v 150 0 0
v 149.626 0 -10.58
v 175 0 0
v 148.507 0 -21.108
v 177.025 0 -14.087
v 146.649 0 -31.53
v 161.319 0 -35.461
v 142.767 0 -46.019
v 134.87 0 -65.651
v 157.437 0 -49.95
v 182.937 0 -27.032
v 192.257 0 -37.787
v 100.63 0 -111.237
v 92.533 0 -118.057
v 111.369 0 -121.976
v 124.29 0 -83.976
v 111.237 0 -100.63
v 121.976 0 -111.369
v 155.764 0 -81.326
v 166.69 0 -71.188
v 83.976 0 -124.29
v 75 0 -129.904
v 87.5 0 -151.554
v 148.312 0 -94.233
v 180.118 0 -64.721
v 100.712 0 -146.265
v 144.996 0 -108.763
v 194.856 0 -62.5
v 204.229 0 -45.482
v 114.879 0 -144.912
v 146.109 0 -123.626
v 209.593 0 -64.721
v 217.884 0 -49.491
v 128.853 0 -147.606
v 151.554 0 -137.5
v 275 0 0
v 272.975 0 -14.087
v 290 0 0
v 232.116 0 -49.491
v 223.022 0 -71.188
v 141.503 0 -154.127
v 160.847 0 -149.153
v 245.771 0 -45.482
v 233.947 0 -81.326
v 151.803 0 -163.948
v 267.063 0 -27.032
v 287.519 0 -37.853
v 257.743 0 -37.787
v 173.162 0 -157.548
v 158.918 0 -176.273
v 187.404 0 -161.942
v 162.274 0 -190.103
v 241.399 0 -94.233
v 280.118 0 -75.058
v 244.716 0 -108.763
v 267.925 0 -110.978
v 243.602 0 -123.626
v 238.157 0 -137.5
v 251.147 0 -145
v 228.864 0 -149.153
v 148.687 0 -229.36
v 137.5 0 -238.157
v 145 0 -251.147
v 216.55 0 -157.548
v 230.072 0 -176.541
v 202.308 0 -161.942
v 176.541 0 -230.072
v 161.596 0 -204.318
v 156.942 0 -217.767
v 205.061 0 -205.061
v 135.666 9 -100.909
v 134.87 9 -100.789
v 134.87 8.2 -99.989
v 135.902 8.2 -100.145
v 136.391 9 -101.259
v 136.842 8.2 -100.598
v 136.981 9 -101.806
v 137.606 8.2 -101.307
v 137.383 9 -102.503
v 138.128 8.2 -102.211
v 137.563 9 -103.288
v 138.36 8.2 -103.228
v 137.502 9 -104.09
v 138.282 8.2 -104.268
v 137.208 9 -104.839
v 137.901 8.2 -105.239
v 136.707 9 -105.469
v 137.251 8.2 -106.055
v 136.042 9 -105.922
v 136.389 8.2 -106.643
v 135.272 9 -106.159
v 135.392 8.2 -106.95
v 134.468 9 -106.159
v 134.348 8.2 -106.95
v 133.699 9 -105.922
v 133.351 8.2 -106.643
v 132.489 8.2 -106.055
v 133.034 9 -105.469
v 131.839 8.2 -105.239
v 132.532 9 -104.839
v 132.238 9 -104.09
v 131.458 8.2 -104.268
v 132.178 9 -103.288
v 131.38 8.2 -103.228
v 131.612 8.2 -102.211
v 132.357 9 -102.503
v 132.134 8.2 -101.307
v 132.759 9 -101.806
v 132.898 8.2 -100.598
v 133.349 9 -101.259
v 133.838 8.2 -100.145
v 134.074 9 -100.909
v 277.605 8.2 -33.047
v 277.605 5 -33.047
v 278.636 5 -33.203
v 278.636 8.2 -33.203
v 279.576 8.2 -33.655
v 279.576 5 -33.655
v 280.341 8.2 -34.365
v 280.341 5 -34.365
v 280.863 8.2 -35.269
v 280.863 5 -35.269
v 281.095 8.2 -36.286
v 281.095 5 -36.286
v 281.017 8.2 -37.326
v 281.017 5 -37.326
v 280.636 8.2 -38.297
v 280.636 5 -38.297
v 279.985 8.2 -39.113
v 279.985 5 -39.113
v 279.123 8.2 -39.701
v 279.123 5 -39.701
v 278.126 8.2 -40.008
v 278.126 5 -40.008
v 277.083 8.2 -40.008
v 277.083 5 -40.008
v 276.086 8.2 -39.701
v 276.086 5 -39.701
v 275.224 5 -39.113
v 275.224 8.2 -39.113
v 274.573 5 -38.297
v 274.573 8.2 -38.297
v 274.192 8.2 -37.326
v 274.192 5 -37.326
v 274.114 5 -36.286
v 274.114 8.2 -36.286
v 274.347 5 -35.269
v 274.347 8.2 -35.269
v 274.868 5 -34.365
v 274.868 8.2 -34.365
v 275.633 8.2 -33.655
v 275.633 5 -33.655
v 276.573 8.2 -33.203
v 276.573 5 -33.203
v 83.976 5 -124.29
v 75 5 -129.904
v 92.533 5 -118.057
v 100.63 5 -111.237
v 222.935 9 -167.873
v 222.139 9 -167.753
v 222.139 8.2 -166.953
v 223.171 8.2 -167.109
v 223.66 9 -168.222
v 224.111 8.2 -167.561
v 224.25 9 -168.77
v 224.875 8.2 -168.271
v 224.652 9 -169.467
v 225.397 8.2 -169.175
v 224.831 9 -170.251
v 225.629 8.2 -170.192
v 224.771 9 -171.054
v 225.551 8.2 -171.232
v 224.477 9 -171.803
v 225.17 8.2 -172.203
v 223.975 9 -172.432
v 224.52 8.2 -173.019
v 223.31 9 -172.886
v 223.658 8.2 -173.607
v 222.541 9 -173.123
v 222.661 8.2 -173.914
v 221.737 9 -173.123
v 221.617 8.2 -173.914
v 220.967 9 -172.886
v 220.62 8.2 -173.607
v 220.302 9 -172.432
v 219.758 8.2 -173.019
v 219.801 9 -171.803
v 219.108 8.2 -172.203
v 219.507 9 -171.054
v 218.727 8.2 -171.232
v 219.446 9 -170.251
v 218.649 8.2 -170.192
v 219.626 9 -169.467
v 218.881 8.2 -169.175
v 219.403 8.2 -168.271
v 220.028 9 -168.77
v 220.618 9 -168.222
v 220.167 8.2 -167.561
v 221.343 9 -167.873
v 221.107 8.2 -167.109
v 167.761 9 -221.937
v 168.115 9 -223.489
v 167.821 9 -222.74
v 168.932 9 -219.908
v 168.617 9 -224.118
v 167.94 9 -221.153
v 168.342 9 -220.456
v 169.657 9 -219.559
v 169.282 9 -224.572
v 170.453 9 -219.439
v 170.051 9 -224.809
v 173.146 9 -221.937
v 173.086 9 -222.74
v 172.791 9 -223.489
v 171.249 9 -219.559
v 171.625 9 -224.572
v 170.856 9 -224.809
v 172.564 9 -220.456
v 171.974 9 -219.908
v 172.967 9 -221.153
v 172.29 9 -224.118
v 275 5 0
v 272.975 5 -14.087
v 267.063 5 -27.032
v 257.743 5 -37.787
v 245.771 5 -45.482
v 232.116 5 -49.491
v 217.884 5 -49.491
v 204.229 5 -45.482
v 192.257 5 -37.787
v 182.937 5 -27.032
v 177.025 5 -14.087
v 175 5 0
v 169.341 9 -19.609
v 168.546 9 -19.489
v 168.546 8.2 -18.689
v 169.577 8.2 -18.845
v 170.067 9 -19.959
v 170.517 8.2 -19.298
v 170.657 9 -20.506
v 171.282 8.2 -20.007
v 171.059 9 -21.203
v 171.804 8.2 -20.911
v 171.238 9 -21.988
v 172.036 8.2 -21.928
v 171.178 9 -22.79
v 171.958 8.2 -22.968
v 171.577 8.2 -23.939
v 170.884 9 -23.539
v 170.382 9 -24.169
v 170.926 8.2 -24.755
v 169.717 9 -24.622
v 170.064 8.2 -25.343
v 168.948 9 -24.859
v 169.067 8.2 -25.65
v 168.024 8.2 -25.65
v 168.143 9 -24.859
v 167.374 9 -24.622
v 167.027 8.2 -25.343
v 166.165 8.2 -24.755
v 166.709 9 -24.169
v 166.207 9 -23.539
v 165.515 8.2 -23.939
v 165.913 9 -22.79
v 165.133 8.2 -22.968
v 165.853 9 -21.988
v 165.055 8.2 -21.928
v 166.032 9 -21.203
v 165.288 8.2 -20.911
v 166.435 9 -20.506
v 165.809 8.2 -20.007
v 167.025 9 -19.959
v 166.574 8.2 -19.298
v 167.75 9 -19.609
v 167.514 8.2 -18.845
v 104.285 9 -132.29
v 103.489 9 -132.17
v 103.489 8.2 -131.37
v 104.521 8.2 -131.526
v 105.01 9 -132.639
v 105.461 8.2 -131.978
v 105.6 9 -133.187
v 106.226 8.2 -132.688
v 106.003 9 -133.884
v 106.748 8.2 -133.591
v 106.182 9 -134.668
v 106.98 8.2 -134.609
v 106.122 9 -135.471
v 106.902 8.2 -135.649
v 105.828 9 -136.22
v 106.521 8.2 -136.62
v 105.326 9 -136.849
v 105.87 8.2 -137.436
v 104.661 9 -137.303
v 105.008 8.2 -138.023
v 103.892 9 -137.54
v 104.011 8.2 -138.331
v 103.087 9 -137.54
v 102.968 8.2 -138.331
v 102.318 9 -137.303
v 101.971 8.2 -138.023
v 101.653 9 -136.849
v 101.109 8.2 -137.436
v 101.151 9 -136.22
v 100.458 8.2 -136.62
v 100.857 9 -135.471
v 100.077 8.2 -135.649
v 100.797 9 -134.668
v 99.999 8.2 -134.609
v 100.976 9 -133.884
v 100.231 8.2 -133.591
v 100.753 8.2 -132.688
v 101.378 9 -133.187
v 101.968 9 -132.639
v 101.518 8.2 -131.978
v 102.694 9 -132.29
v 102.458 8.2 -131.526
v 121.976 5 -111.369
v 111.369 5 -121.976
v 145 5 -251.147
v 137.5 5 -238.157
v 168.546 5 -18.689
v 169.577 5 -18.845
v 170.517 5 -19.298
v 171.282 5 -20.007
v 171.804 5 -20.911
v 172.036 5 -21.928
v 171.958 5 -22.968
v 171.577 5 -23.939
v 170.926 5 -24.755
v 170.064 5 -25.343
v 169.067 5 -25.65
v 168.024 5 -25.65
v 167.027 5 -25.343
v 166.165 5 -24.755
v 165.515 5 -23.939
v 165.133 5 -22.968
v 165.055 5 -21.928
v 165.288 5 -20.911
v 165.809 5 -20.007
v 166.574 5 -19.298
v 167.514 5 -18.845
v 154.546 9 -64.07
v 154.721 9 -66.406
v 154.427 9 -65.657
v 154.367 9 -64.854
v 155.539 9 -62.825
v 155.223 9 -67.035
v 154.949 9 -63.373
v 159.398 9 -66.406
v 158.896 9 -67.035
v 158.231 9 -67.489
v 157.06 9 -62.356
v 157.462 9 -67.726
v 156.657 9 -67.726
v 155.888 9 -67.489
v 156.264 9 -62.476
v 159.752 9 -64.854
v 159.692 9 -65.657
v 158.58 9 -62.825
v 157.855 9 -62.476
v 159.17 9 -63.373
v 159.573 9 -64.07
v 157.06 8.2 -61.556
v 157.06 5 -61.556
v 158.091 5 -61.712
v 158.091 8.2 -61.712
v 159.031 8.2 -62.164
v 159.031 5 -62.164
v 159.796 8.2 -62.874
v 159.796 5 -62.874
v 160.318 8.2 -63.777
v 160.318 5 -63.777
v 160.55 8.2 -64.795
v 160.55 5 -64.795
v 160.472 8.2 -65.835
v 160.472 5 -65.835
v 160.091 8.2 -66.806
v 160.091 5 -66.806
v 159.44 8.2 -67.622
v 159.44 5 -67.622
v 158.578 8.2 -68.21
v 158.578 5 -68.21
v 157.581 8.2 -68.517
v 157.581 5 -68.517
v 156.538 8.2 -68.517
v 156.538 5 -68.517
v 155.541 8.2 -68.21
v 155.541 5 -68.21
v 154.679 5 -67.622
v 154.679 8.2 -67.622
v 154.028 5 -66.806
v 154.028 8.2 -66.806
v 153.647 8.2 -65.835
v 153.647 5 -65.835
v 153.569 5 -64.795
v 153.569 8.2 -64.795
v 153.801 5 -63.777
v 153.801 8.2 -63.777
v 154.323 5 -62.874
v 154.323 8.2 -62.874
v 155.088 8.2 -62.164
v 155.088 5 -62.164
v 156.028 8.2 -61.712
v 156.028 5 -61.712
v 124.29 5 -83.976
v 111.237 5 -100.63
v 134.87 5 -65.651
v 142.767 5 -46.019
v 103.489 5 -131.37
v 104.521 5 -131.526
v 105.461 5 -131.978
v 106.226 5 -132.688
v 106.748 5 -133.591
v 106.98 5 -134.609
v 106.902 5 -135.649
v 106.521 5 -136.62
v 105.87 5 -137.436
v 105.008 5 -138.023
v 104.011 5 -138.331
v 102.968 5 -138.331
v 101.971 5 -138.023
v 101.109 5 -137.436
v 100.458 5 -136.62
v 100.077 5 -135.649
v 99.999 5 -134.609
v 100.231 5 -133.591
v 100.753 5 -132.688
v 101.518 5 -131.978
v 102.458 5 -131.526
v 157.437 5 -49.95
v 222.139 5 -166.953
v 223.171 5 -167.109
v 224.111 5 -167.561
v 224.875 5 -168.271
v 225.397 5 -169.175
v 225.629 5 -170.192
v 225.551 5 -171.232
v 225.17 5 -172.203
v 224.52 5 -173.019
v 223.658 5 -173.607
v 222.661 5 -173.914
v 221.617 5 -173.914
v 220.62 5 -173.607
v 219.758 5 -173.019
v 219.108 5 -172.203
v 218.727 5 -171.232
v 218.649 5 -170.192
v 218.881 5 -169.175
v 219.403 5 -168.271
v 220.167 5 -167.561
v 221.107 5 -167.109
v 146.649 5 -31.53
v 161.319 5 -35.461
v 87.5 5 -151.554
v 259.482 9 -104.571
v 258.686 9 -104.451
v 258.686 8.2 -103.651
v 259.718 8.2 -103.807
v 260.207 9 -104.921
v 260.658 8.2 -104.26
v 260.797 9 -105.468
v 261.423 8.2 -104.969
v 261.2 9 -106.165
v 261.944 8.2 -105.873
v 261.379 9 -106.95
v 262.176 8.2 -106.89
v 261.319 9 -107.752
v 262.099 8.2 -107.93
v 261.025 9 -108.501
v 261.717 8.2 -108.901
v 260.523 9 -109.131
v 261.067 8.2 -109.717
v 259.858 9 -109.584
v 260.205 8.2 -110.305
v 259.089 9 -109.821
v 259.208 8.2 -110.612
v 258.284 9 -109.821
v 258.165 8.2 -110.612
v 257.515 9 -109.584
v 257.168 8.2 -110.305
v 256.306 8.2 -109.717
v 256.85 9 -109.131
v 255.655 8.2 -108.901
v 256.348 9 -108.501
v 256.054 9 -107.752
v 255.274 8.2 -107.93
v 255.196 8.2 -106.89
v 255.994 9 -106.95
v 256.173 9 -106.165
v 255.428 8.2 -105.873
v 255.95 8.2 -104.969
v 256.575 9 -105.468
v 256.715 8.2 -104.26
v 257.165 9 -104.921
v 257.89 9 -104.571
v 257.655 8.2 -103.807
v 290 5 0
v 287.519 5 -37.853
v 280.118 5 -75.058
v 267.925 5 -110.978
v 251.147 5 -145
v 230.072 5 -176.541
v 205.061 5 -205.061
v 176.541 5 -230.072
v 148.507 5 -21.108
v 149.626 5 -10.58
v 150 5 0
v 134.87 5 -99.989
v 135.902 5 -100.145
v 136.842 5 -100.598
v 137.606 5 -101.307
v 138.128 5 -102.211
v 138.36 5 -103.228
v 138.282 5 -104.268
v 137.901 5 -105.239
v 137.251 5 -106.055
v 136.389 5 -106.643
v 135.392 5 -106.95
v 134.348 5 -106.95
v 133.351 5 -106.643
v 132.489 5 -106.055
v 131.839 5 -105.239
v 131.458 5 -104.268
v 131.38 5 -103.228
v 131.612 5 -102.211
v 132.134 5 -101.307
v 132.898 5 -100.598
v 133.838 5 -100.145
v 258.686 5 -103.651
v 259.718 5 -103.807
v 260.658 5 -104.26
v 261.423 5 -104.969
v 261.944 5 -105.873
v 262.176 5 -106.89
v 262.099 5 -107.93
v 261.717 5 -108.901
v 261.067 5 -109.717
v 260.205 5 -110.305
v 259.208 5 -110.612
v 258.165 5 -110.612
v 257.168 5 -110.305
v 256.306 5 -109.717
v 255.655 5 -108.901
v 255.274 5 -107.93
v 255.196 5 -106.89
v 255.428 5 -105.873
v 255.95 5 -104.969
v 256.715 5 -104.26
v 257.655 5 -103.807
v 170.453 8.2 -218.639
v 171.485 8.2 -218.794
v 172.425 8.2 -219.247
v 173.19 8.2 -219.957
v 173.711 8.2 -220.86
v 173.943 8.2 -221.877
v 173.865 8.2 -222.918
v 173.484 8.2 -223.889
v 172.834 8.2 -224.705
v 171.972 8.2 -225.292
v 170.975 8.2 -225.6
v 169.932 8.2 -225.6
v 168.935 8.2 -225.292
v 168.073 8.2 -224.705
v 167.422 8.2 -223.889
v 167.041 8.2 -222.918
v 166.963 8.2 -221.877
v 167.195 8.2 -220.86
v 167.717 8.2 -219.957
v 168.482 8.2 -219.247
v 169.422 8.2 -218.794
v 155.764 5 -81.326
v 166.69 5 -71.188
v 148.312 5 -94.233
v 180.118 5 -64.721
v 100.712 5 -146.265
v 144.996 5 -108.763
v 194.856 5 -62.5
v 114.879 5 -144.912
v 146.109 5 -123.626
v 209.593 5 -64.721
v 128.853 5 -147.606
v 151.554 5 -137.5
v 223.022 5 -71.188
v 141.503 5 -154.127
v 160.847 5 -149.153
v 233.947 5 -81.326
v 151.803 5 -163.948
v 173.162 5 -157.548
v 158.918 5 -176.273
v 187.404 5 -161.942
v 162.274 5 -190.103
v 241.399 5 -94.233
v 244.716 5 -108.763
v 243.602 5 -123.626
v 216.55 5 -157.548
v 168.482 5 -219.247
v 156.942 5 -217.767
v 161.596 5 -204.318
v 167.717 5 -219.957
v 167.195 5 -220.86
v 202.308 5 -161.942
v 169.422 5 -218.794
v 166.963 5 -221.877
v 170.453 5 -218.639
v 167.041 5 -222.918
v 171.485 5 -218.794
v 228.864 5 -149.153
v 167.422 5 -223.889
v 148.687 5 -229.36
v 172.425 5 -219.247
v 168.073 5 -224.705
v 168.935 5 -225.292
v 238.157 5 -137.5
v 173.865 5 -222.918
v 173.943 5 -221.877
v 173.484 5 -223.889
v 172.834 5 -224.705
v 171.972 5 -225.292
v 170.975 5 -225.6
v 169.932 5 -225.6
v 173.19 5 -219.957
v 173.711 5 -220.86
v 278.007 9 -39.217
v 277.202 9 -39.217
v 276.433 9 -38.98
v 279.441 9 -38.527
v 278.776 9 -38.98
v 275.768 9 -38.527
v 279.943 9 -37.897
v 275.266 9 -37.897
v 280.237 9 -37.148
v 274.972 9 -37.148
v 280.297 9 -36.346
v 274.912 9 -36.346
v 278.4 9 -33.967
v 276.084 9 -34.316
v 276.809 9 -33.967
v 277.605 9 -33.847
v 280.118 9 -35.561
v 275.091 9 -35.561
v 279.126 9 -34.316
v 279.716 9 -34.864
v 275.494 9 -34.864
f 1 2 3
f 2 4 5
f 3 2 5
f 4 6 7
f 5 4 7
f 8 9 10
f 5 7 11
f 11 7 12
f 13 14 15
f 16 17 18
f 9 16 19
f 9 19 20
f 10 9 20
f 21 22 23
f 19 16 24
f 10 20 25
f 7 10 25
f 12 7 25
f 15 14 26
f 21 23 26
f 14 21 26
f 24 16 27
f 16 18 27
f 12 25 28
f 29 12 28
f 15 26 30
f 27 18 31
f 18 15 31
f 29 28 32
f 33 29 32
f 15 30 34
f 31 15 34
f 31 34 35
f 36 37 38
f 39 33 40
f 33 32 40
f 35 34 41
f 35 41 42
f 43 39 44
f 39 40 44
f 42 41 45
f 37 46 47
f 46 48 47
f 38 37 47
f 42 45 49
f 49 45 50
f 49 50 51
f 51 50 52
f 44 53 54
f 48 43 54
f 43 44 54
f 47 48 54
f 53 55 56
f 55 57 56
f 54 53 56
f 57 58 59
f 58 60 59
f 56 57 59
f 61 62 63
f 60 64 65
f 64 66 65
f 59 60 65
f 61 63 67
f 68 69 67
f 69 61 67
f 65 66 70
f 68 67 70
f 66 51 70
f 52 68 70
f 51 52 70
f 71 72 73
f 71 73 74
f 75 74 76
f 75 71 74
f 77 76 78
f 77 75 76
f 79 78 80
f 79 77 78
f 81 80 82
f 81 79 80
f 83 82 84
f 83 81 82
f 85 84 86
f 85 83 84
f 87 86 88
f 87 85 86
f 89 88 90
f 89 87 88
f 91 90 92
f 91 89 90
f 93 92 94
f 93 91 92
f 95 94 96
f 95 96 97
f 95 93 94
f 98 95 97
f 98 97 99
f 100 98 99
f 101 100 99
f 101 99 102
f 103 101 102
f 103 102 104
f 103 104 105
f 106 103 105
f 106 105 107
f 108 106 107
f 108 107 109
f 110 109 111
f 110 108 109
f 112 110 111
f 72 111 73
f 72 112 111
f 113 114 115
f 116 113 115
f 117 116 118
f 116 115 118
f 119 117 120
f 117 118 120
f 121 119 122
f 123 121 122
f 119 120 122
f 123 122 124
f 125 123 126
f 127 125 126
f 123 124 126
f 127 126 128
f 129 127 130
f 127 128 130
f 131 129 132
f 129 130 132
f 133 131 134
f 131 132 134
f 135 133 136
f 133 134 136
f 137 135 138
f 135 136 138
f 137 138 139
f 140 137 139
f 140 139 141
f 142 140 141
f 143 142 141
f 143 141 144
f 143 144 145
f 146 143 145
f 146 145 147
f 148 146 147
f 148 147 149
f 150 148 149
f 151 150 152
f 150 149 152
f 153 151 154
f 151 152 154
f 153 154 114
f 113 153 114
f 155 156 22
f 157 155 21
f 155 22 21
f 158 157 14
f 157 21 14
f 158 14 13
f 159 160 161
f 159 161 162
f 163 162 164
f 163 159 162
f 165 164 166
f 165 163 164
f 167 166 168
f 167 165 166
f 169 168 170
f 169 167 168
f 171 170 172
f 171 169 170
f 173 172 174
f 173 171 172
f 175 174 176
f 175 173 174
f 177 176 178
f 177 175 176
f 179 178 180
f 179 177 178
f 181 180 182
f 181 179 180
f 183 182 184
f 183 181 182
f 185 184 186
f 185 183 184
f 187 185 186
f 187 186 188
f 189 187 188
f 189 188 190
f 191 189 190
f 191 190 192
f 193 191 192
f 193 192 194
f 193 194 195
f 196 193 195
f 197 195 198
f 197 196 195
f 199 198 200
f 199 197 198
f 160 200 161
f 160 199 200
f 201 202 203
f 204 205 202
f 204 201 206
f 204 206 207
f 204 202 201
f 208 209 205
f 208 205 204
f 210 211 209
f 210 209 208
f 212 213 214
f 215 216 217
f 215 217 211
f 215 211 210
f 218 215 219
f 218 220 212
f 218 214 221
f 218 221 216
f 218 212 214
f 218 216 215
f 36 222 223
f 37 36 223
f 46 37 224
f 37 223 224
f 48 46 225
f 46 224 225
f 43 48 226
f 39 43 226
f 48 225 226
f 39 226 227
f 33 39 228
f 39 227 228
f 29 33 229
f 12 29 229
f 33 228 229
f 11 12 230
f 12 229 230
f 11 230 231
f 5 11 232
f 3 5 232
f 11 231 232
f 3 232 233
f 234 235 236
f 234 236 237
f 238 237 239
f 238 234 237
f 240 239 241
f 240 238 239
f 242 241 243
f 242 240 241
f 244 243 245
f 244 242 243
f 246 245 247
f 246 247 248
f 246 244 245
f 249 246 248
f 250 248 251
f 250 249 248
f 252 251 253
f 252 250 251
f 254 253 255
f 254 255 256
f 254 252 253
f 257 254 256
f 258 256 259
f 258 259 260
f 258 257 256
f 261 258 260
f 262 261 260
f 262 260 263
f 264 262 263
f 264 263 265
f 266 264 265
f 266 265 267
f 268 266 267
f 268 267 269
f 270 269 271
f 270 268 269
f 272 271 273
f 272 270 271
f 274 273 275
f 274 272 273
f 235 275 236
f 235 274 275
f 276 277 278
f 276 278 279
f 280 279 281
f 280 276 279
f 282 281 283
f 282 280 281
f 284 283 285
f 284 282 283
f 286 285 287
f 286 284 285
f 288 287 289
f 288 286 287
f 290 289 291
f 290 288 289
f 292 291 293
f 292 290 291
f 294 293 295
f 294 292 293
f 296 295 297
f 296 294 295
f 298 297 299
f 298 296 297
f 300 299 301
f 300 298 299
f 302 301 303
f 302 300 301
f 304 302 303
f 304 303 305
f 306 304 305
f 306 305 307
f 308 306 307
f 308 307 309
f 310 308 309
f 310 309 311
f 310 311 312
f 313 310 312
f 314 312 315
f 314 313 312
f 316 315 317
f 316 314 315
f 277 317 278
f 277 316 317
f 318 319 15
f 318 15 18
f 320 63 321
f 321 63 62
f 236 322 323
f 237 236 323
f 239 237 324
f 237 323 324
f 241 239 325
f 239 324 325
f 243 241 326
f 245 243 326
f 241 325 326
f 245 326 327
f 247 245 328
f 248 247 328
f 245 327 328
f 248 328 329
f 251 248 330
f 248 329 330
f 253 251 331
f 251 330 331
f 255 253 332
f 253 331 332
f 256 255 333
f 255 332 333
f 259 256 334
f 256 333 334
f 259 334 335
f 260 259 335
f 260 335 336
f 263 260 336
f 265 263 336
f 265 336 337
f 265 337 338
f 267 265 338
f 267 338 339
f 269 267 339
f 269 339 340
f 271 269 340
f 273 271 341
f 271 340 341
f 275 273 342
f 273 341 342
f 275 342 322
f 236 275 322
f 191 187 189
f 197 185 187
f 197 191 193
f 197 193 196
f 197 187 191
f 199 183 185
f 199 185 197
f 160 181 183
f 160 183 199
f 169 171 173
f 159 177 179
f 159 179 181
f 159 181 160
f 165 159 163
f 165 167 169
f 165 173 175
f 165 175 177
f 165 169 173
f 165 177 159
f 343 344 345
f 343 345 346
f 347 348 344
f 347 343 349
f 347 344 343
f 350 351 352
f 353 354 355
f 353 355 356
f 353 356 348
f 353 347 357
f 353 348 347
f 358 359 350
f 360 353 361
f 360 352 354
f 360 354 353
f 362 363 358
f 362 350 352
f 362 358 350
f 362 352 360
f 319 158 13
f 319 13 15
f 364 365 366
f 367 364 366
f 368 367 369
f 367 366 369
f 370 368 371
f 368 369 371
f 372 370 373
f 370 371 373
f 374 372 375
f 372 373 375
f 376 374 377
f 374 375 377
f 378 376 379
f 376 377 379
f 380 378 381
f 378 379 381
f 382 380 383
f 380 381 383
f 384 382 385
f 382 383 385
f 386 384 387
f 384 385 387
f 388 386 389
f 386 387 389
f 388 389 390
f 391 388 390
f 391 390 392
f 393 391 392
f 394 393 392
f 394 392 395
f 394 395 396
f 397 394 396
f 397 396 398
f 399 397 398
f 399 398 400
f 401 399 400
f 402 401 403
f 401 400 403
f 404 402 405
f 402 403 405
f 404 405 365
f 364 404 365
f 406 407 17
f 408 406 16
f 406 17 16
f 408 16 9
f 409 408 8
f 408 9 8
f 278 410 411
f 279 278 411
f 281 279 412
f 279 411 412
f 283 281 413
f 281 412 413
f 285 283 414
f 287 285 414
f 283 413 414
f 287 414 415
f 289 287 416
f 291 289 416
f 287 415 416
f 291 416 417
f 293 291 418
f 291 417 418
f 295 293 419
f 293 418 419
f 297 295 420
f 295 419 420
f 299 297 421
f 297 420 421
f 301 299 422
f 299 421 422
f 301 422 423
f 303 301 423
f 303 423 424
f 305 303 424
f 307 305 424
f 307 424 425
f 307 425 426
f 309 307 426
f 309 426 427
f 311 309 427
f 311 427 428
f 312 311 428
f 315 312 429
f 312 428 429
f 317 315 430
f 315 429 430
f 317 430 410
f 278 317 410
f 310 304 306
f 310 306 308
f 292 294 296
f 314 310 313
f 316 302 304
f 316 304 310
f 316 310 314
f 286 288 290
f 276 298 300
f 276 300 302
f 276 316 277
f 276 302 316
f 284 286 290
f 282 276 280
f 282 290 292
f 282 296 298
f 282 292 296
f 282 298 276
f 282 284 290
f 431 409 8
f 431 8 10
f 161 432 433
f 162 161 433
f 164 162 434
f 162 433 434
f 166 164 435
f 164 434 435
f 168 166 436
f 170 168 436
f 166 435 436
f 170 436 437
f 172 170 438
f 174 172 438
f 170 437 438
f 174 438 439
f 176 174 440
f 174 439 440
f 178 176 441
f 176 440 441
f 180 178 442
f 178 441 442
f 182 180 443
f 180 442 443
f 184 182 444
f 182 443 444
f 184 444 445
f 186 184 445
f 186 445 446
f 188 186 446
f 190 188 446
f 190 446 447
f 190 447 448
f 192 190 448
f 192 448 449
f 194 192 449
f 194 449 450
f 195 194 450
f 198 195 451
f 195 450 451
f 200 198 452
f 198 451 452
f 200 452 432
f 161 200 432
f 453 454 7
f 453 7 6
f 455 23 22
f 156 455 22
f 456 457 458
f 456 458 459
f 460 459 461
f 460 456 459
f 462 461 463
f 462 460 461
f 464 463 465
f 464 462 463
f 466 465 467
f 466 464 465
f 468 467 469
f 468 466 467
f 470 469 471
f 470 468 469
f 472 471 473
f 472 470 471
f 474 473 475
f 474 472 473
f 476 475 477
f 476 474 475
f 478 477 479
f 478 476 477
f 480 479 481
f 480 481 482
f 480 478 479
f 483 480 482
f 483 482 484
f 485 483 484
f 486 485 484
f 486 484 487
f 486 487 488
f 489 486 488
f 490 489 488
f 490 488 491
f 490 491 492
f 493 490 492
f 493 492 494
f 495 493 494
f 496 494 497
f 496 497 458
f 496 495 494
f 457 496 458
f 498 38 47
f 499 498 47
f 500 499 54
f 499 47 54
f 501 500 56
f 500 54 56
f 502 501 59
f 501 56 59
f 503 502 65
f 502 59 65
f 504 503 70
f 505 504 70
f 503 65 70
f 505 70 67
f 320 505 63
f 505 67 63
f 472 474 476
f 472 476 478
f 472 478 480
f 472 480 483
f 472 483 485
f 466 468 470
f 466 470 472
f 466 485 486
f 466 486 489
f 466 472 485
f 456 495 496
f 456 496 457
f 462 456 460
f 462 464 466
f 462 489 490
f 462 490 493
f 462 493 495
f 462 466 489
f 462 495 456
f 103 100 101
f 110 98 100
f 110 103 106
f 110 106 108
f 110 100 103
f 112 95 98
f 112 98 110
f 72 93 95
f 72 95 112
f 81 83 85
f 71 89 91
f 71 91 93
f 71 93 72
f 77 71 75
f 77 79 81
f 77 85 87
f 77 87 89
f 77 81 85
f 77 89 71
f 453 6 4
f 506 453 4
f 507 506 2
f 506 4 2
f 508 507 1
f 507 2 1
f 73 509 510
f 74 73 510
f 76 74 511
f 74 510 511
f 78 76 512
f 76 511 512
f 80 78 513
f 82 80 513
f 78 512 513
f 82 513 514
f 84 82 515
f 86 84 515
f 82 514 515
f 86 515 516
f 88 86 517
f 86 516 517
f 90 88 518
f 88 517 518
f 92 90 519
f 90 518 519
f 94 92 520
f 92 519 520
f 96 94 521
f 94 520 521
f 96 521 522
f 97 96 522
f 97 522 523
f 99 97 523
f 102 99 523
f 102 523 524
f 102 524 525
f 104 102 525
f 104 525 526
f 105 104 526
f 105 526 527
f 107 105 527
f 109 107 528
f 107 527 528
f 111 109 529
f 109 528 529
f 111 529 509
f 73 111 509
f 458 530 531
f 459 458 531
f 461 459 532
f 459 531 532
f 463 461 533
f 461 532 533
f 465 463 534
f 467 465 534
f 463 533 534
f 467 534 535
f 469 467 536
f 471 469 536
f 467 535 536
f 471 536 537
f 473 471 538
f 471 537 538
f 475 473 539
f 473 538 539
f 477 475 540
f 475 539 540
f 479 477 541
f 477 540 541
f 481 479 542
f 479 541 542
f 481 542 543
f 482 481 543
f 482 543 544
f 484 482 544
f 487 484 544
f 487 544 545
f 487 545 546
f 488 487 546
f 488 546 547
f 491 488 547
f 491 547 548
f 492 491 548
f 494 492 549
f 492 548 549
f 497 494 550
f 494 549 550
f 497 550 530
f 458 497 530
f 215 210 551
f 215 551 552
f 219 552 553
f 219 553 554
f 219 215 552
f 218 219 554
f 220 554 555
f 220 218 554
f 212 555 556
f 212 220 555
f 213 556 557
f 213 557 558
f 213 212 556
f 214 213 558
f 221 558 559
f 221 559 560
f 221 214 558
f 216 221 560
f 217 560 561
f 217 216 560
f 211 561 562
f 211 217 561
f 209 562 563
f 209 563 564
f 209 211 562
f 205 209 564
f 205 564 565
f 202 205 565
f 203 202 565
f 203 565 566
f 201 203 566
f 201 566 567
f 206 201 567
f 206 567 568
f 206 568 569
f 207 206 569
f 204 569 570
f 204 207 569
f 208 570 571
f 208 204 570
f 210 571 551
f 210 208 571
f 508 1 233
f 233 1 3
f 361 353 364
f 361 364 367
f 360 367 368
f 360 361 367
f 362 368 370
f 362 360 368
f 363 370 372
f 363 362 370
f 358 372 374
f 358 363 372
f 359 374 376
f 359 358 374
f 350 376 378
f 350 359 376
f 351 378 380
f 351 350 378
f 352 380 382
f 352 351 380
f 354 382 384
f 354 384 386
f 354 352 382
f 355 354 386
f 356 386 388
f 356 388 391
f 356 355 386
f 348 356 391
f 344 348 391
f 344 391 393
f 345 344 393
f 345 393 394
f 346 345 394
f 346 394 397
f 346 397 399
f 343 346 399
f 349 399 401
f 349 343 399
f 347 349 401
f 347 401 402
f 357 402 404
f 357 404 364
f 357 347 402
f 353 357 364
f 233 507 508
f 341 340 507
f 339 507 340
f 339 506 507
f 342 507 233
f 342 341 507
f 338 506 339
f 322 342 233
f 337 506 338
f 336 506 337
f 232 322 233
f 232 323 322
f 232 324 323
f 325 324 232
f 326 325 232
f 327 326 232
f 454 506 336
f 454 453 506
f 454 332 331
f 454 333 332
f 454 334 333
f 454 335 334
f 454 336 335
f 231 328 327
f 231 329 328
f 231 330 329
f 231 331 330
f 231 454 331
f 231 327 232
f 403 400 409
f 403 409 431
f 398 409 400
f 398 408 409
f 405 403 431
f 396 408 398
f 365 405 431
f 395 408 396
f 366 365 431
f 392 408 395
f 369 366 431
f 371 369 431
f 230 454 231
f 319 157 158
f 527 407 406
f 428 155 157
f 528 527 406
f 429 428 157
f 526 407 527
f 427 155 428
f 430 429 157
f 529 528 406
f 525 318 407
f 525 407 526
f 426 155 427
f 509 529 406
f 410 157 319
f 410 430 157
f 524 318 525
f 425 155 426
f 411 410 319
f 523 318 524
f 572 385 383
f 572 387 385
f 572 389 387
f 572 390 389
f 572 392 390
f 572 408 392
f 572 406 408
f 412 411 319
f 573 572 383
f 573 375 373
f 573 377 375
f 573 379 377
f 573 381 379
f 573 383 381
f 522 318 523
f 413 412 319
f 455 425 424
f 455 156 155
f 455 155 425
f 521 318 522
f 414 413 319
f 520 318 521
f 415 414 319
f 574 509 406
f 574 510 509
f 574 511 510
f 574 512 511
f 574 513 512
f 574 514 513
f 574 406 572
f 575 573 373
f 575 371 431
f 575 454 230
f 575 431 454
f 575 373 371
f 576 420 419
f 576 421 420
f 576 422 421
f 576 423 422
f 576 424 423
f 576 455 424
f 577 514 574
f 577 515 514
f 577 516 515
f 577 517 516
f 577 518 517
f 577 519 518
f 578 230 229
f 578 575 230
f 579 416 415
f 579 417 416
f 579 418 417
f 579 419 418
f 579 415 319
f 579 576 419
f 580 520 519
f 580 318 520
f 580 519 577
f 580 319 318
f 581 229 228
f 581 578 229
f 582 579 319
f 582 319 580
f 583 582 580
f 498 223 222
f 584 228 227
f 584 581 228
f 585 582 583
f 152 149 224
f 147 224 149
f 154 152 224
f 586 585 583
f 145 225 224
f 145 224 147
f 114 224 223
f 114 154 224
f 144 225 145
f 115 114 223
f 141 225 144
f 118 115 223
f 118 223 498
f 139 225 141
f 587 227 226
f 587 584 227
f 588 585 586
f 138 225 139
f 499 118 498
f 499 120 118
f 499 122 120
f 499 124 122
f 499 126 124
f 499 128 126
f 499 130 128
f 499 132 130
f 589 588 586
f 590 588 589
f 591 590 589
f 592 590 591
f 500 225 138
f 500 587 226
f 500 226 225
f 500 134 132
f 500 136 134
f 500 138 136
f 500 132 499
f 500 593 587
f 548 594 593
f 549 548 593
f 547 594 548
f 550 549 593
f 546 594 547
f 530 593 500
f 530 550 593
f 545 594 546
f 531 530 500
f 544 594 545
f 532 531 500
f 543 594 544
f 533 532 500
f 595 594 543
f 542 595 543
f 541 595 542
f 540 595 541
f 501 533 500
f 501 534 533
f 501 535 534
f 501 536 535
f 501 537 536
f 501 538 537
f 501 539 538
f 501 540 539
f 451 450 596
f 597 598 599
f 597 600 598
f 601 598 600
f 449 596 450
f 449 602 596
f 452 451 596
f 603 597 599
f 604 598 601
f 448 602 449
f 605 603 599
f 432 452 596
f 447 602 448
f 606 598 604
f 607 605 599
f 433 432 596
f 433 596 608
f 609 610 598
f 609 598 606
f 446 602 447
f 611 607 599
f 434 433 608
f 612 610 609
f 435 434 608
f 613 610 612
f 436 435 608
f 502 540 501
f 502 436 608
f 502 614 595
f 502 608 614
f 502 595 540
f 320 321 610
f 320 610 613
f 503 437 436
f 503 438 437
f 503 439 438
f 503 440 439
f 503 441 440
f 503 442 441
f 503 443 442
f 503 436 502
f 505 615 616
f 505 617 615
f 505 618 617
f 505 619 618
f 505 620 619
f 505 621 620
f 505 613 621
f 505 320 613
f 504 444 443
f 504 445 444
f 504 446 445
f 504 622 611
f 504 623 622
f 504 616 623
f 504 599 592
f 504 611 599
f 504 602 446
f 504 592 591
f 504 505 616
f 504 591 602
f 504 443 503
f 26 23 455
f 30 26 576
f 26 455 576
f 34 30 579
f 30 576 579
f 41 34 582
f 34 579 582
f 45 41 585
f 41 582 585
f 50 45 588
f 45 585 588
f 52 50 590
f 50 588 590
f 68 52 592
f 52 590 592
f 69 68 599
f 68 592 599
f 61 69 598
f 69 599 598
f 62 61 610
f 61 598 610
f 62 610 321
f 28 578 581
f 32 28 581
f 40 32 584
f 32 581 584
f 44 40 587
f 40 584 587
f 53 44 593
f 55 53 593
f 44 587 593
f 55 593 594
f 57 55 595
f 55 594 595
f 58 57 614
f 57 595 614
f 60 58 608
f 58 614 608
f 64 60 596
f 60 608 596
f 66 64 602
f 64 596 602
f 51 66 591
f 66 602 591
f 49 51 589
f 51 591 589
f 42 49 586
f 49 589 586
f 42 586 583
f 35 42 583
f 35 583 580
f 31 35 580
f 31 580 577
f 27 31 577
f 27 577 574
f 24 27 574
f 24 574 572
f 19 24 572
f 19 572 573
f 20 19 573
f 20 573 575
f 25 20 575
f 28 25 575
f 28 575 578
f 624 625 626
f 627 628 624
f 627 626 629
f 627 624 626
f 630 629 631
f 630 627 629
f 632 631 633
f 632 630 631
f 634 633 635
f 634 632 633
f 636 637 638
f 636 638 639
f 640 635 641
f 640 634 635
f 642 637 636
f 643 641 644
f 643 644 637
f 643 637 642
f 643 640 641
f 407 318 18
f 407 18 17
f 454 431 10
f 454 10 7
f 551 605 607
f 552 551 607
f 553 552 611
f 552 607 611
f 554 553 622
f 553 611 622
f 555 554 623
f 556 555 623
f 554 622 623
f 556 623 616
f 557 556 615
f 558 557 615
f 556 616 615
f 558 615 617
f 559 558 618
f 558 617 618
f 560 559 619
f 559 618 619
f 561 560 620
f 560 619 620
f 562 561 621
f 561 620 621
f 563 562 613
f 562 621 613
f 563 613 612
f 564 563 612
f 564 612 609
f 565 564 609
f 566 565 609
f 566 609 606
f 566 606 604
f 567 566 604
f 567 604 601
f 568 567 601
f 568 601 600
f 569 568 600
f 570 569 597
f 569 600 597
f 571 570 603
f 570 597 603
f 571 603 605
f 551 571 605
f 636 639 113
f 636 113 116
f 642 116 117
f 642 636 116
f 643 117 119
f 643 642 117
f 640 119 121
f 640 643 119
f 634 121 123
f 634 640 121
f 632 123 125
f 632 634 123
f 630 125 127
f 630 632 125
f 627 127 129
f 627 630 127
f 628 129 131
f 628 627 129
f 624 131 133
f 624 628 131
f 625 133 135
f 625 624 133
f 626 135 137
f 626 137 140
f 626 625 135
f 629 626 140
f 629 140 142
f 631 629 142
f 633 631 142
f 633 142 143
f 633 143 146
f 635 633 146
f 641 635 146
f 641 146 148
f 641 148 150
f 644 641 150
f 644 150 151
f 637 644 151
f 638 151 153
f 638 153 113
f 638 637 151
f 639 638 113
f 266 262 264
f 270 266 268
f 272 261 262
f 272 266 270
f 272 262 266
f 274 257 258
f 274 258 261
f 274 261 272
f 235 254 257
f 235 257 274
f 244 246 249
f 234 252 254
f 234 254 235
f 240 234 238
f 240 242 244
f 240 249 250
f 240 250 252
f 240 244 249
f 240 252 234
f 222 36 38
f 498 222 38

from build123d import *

# Parameters (mm, degrees)
AUFSATZ_LINEAR_AUSTRAGEN1_DEPTH = 5
SKIZZE2_R                       = 50
SCHNITT_LINEAR_AUSTRAGEN1_DEPTH = 384.666521865
SKIZZE3_R                       = 3.5
AUFSATZ_LINEAR_AUSTRAGEN2_DEPTH = 4
FASE1_SIZE                      = 0.8
SCHNITT_LINEAR_AUSTRAGEN2_DEPTH = 384.666521865


with BuildPart() as part:
    # Skizze1 → Aufsatz-Linear austragen1 (new body)
    with BuildSketch(Plane(origin=(0, 0, 0), x_dir=(1, 0, 0), z_dir=(0, 1, 0))):
        with BuildLine():
            Line((150, 0), (290, 0))
            ThreePointArc((290, 0), (251.147367097, 145), (145, 251.147367097))
            Line((145, 251.147367097), (75, 129.903810568))
            ThreePointArc((75, 129.903810568), (129.903810568, 75), (150, 0))
        make_face()
    extrude(amount=AUFSATZ_LINEAR_AUSTRAGEN1_DEPTH)

    # Skizze2 → Schnitt-Linear austragen1 (cut, through all)
    with BuildSketch(Plane(origin=(0, 5, 0), x_dir=(1, 0, 0), z_dir=(0, 1, 0))):
        with Locations((112.5, 194.855715851)):
            Circle(SKIZZE2_R)
        with Locations(Location((194.855715851, 112.5, 0), (0, 0, 270))):
            Circle(SKIZZE2_R)
        with Locations((225, 0)):
            Circle(SKIZZE2_R)
    extrude(amount=-SCHNITT_LINEAR_AUSTRAGEN1_DEPTH, mode=Mode.SUBTRACT)

    # Skizze3 → Aufsatz-Linear austragen2 (add)
    with BuildSketch(Plane(origin=(0, 5, 0), x_dir=(1, 0, 0), z_dir=(0, 1, 0))):
        with Locations(Location((168.545626434, 22.189452677, 0), (0, 0, 270))):
            Circle(SKIZZE3_R)
        with Locations(Location((277.604561185, 36.547333822, 0), (0, 0, 270))):
            Circle(SKIZZE3_R)
        with Locations(Location((157.059520527, 65.056183502, 0), (0, 0, 270))):
            Circle(SKIZZE3_R)
        with Locations(Location((134.87006785, 103.489442931, 0), (0, 0, 270))):
            Circle(SKIZZE3_R)
        with Locations(Location((103.489442931, 134.87006785, 0), (0, 0, 270))):
            Circle(SKIZZE3_R)
        with Locations(Location((170.453200122, 222.138935282, 0), (0, 0, 270))):
            Circle(SKIZZE3_R)
        with Locations(Location((222.138935282, 170.453200122, 0), (0, 0, 270))):
            Circle(SKIZZE3_R)
        with Locations(Location((258.686269103, 107.151361062, 0), (0, 0, 270))):
            Circle(SKIZZE3_R)
    extrude(amount=AUFSATZ_LINEAR_AUSTRAGEN2_DEPTH)

    # Fase1
    fase1_edges = [part.edges().sort_by_distance(p)[0] for p in [
        (168.545626434, 9, -25.689452677),
        (277.604561185, 9, -40.047333822),
        (157.059520527, 9, -68.556183502),
        (134.87006785, 9, -106.989442931),
        (103.489442931, 9, -138.37006785),
        (170.453200122, 9, -225.638935282),
        (222.138935282, 9, -173.953200122),
        (258.686269103, 9, -110.651361062),
    ]]
    chamfer(fase1_edges, length=FASE1_SIZE)

    # Skizze4 → Schnitt-Linear austragen2 (cut, through all)
    with BuildSketch(Plane(origin=(0, 5, 0), x_dir=(1, 0, 0), z_dir=(0, 1, 0))):
        with BuildLine():
            Line((100.63005083, 111.236652548), (111.369318037, 121.975919755))
            Line((111.369318037, 121.975919755), (121.975919755, 111.369318037))
            Line((121.975919755, 111.369318037), (111.236652548, 100.63005083))
            ThreePointArc((111.236652548, 100.63005083), (106.066017178, 106.066017178), (100.63005083, 111.236652548))
        make_face()
        with BuildLine():
            Line((142.766506677, 46.018741523), (157.436618499, 49.949586139))
            Line((157.436618499, 49.949586139), (161.318904176, 35.460698745))
            Line((161.318904176, 35.460698745), (146.648792353, 31.529854129))
            ThreePointArc((146.648792353, 31.529854129), (144.888873943, 38.822856765), (142.766506677, 46.018741523))
        make_face()
    extrude(amount=-SCHNITT_LINEAR_AUSTRAGEN2_DEPTH, mode=Mode.SUBTRACT)


solid = part.part
